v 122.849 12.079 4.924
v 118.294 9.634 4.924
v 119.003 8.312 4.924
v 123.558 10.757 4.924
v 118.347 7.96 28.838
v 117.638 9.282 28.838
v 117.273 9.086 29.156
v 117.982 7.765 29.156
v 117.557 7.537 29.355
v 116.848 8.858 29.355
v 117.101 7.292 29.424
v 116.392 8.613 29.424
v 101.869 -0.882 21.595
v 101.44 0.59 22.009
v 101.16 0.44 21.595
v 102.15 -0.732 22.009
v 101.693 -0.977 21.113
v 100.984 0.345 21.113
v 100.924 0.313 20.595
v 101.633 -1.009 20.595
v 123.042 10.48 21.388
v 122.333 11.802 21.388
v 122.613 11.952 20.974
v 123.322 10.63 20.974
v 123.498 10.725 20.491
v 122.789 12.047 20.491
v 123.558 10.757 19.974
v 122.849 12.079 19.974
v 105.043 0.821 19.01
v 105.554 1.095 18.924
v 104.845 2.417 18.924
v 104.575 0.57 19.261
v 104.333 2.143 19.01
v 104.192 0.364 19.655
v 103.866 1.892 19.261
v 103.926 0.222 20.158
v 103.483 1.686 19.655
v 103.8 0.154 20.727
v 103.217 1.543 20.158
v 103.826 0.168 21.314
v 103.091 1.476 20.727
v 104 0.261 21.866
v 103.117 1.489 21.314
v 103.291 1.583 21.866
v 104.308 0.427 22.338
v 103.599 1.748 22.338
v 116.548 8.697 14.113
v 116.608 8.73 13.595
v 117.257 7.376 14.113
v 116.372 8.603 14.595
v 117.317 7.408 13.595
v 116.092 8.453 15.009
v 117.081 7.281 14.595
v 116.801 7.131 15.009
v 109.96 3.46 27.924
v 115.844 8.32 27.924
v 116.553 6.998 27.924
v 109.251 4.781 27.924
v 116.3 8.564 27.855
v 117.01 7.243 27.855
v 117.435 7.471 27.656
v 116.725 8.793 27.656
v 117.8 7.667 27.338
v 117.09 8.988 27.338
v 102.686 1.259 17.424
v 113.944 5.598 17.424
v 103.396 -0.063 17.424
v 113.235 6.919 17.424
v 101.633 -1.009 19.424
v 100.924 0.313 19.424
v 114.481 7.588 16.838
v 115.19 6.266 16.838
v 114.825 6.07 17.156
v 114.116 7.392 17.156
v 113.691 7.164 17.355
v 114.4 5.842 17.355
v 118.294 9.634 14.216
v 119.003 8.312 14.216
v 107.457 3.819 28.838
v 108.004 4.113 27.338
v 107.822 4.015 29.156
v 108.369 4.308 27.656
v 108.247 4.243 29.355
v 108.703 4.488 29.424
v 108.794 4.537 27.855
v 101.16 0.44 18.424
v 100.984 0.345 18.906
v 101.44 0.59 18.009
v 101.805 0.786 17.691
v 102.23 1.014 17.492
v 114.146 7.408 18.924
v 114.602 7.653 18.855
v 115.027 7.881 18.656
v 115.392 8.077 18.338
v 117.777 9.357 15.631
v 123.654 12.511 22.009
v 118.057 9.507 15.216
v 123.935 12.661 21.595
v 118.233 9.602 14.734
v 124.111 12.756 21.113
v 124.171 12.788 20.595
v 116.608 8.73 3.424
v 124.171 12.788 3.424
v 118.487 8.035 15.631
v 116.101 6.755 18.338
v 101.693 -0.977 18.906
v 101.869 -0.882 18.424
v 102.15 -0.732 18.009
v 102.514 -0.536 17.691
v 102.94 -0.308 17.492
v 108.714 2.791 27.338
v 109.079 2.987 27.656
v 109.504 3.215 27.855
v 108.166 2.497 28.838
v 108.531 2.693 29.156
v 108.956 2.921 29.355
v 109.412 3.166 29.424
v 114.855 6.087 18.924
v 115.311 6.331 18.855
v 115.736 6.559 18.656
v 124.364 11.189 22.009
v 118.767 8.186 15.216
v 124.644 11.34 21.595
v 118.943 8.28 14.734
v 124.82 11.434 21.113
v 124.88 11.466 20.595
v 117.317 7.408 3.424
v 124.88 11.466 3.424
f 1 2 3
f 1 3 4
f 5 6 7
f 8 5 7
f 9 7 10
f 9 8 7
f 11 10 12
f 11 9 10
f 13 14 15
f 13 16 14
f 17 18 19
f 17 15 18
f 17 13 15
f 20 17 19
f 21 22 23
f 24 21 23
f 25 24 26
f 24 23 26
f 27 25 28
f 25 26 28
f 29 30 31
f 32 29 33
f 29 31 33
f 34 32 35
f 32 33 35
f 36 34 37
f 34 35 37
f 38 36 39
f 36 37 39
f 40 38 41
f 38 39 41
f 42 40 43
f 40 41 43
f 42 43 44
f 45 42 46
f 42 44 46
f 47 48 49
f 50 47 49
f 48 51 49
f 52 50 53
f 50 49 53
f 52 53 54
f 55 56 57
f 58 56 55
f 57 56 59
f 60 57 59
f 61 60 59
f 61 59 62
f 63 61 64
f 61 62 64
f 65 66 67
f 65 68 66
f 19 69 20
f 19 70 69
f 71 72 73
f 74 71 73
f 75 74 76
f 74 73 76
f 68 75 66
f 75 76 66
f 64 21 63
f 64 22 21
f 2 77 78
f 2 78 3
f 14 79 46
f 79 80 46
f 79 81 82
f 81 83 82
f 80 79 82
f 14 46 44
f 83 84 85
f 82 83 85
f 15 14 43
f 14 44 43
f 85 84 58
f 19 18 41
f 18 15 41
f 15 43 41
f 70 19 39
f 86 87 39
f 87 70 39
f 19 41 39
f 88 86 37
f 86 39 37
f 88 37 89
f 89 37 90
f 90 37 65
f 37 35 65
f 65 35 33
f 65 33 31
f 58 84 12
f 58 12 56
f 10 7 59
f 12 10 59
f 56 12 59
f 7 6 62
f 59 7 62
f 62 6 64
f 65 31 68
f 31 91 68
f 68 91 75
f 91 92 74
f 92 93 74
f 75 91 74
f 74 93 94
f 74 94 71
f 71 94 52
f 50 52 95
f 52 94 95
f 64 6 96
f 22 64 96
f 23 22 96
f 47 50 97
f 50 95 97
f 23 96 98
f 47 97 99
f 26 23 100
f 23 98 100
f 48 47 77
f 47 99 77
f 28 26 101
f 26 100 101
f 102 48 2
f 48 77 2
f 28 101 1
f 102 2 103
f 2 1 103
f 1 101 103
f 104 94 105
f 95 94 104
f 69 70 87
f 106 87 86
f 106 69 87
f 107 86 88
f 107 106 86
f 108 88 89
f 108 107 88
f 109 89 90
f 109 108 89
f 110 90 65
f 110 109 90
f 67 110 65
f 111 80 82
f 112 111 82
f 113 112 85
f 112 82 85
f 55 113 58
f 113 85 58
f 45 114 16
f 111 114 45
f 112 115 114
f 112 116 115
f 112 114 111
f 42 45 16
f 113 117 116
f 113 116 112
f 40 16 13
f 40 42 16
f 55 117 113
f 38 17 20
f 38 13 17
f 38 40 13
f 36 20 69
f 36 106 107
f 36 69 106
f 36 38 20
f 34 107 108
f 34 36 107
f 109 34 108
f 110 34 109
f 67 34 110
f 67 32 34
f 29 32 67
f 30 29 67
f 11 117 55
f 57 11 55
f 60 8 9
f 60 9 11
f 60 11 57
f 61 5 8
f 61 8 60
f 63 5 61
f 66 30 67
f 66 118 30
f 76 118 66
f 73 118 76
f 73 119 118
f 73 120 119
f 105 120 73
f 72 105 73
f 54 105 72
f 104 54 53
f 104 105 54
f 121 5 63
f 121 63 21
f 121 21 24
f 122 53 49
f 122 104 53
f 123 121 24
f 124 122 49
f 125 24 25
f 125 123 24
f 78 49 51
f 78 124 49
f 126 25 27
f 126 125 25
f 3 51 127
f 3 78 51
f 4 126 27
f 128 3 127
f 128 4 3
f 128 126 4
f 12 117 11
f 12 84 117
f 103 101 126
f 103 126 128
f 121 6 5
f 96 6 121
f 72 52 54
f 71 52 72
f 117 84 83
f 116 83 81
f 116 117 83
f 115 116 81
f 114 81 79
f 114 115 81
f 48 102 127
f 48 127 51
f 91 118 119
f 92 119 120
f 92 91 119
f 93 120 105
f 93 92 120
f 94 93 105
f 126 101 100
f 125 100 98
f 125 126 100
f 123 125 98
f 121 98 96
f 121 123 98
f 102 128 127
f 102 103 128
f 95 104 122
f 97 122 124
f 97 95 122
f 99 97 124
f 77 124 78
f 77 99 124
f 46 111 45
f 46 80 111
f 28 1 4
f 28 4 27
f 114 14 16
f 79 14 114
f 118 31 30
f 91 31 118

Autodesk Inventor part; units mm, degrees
ref_plane "YZ Plane" through (0, 0, 0) normal (1, 0, 0) x (0, 1, 0)
ref_plane "XZ Plane" through (0, 0, 0) normal (0, 1, 0) x (-1, 0, 0)
ref_plane "XY Plane" through (0, 0, 0) normal (0, 0, 1) x (1, 0, 0)
ref_plane "Work Plane1" through (118.9518, 9.9874, -13.1749) normal (0.4728584, -0.8811384, 0) x (0, 0, -1)
sketch "Sketch1" plane through (118.9518, 9.9874, -13.1749) normal (0.4728584, -0.8811384, 0) x (0, 0, -1)
  line L0 (-16.5984, 5.5392) -> (-16.5984, 5.9228)
  line L1 (-1.2281, -14.4596) -> (-31.7652, -14.4596) construction
  line L2 (-16.5984, 11.5008) -> (-16.5984, -0.9971) projected
  line L3 (-15.5984, -2) -> (-12.5984, -2)
  line L4 (-16.5984, 2) -> (-12.5984, 2)
  line L5 (-16.5984, -2.6601) -> (-27.5984, -2.6601)
  line L6 (-27.5984, -2.6601) -> (-30.5984, -5.6601)
  line L7 (-30.5984, -5.6601) -> (-30.5984, -8.4596)
  line L8 (-30.5984, -8.4596) -> (-30.5984, -20.4596)
  line L9 (-30.5984, -20.4596) -> (-34.5984, -20.4596)
  line L10 (-34.5984, -20.4596) -> (-42.5984, -12.4596)
  line L11 (-42.5984, -12.4596) -> (-42.5984, -2.0772)
  line L12 (-42.5984, -2.0772) -> (-34.5984, 5.9228)
  line L13 (-34.5984, 5.9228) -> (-16.5984, 5.9228)
  line L14 (-16.5984, 0.8574) -> (-16.5984, 5.9228)
  line L15 (-16.5984, 3.3399) -> (-48.439, 3.3399) construction
  line L16 (-16.5984, -0.9971) -> (-16.5984, -2.6601)
  line L17 (-16.5984, -0.0772) -> (-40.5984, -0.0772) construction
  line L18 (-40.5984, -0.0772) -> (-40.5984, -14.4596) construction
  line L19 (-16.5984, -0.0772) -> (-40.5984, -0.0772)
  line L20 (-19.5984, -2.6601) -> (-17.0984, -2.6601) projected
  point P0 (-13.1749, -109.5356)
  point P1 (-16.5984, 0.8574)
  dimension "d25" = 135
  dimension "d26" = 4
  dimension "d27" = 6
  dimension "d28" = 2.5829
  dimension "d29" = 6
  dimension "d31" = 12
  dimension "d40" = 3
  dimension "d42" = 26
  dimension "d45" = 0
  dimension "d50" = 8
  dimension "d62" = 0
extrude "Extrusion1" add sketch "Sketch1" along normal blind 1.5
sketch "Sketch2" plane through (119.6611, 8.6657, -13.1749) normal (0.4728584, -0.8811384, 0) x (0.8811384, 0.4728584, 0)
  line L0 (-2.0772, 42.5984) -> (-12.4596, 42.5984) projected
  line L1 (-12.4596, 42.5984) -> (-20.4596, 34.5984) projected
  line L2 (-20.4596, 34.5984) -> (-20.4596, 30.5984) projected
  line L3 (-20.4596, 30.5984) -> (-5.6601, 30.5984) projected
  line L4 (-5.6601, 30.5984) -> (-2.6601, 27.5984) projected
  line L5 (-2.6601, 27.5984) -> (-2.6601, 16.5984) projected
  line L6 (5.9228, 16.5984) -> (5.9228, 34.5984) projected
  line L7 (5.9228, 34.5984) -> (-2.0772, 42.5984) projected
  line L8 (-2.6601, 16.5984) -> (5.9228, 16.5984) projected
  line L9 (-11.8383, 41.0984) -> (-2.6985, 41.0984)
  line L10 (-2.6985, 41.0984) -> (4.4228, 33.9771)
  line L11 (4.4228, 33.9771) -> (4.4228, 18.0984)
  line L12 (4.4228, 18.0984) -> (-0.9902, 18.0984)
  line L13 (-0.9902, 18.0984) -> (-1.1601, 18.0962)
  line L14 (-1.1601, 18.0962) -> (-1.1601, 28.2197)
  line L15 (-1.1601, 28.2197) -> (-5.0388, 32.0984)
  line L16 (-5.0388, 32.0984) -> (-8.9884, 32.0984)
  line L17 (-8.9884, 32.0984) -> (-9.9596, 32.0984)
  line L18 (-9.9596, 32.0984) -> (-18.9596, 32.0984)
  line L19 (-18.9596, 32.0984) -> (-18.9596, 33.9771)
  line L20 (-18.9596, 33.9771) -> (-11.8383, 41.0984)
  point P0 (-109.5356, 13.1749)
  point P1 (-0.7471, 18.0984)
  dimension "d41" = 1.5
  dimension "d63" = 1.5
extrude "Extrusion2" [suppressed]
sketch "Sketch3" plane through (103.5006, 1.6956, 17.4235) normal (0, 0, -1) x (-0.8811384, -0.4728584, 0)
  circle A0 centre (-2.8052, -7.75) radius 4.5
  line L0 (3.1948, 0) -> (-8.8052, 0) projected
  line L1 (-8.8052, 0) -> (-8.8052, -15.5) projected
  line L2 (3.1948, -15.5) -> (-8.8052, -15.5) projected
  line L3 (3.1948, 0) -> (3.1948, -15.5) projected
  point P0 (92.0001, 47.4471)
extrude "Extrusion3" cut sketch "Sketch3" against normal blind 1.5 contours A0
sketch "Sketch8" plane through (119.7213, 8.698, 3.4235) normal (0, 0, 1) x (0.8811384, 0.4728584, 0)
  circle A0 centre (-19.1075, 3.6497) radius 1.4001 projected
  circle A1 centre (-14.1578, 7.8923) radius 2 projected
  circle A2 centre (-14.1578, 7.8923) radius 3.3708
  point P0 (-109.604, 48.9471)
extrude "Extrusion8" cut sketch "Sketch8" along normal mid plane 14 contours A1 | A2
sketch "Sketch9" plane through (118.7885, 8.1974, 4.9235) normal (0, 0, 1) x (0.8811384, 0.4728584, 0)
  circle A0 centre (0.9902, -6.25) radius 1.352 projected
  circle A1 centre (0.9902, -6.25) radius 2.6601
  point P0 (-108.5454, 48.9471)
extrude "Extrusion9" [suppressed]
ref_plane "Arbeitsebene3" through (124.1706, 12.788, 7.4235) normal (0, 0, -1) x (-0.8811384, -0.4728584, 0)
sketch "Skizze13" plane through (124.1706, 12.788, 7.4235) normal (0, 0, -1) x (-0.8811384, -0.4728584, 0)
  line L0 (0, 0) -> (0, -1.5) projected
  circle A0 centre (-2.8278, -9.3645) radius 1.1933 projected
  line L1 (8.5829, 0) -> (0, 0) projected
  line L2 (0, 0) -> (0, -15.5)
  line L3 (0, -15.5) -> (-6.5, -15.5)
  line L4 (-6.5, -15.5) -> (-6.5, 0)
  line L5 (-6.5, 0) -> (0, 0)
  circle A1 centre (-2.8278, -9.3645) radius 1.6 projected
  circle A2 centre (-2.8278, -9.3645) radius 1.75
  point P0 (115.4584, 47.4471)
  point P1 (-2.8531, -15.3156)
  dimension "d58" = 6.5
  dimension "d66" = 3.5
extrude "Extrusion13" [suppressed]
fillet "Rundung1" radius 2 7 edges at (124.5253, 12.1272, 21.4235) (108.3278, 3.4349, 29.4235) (101.2787, -0.348, 21.4235) (101.2787, -0.348, 17.4235) (114.3191, 6.6501, 17.4235) (116.9625, 8.0687, 14.4235) (117.4762, 8.3443, 29.4235)
sketch "Skizze14" plane through (118.9518, 9.9874, -13.1749) normal (-0.4728584, 0.8811384, 0) x (0.8811384, 0.4728584, 0)
  arc A0 (3.8371, -34.5629) -> (4.4228, -33.1487) centre (2.4228, -33.1487) ccw projected
  line L0 (3.8371, -34.5629) -> (-2.1127, -40.5126) projected
  arc A1 (-3.5269, -41.0984) -> (-2.1127, -40.5126) centre (-3.5269, -39.0984) ccw projected
  line L1 (-3.5269, -41.0984) -> (-11.0098, -41.0984) projected
  arc A2 (-12.4241, -40.5126) -> (-11.0098, -41.0984) centre (-11.0098, -39.0984) ccw projected
  line L2 (-12.4241, -40.5126) -> (-17.4241, -35.5126) projected
  arc A3 (-16.0098, -32.0984) -> (-17.4241, -35.5126) centre (-16.0098, -34.0984) ccw projected
  line L3 (-16.0098, -32.0984) -> (-5.4542, -32.0984) projected
  arc A4 (-5.4542, -32.0984) -> (-4.04, -31.5126) centre (-5.4542, -30.0984) ccw projected
  line L4 (-4.04, -31.5126) -> (-1.3329, -28.8055) projected
  arc A5 (-1.3329, -28.8055) -> (-0.7471, -27.3913) centre (-2.7471, -27.3913) ccw projected
  line L5 (-0.7471, -27.3913) -> (-0.7471, -18.0984) projected
  line L6 (-0.7471, -18.0984) -> (4.4228, -18.0984) projected
  line L7 (4.4228, -18.0984) -> (4.4228, -33.1487) projected
  point P0 (-109.5356, -13.1749)
extrude "Extrusion14" cut sketch "Skizze14" against normal blind 10
properties part number "Matchboxscope_Lightperiscope_long_V0"
